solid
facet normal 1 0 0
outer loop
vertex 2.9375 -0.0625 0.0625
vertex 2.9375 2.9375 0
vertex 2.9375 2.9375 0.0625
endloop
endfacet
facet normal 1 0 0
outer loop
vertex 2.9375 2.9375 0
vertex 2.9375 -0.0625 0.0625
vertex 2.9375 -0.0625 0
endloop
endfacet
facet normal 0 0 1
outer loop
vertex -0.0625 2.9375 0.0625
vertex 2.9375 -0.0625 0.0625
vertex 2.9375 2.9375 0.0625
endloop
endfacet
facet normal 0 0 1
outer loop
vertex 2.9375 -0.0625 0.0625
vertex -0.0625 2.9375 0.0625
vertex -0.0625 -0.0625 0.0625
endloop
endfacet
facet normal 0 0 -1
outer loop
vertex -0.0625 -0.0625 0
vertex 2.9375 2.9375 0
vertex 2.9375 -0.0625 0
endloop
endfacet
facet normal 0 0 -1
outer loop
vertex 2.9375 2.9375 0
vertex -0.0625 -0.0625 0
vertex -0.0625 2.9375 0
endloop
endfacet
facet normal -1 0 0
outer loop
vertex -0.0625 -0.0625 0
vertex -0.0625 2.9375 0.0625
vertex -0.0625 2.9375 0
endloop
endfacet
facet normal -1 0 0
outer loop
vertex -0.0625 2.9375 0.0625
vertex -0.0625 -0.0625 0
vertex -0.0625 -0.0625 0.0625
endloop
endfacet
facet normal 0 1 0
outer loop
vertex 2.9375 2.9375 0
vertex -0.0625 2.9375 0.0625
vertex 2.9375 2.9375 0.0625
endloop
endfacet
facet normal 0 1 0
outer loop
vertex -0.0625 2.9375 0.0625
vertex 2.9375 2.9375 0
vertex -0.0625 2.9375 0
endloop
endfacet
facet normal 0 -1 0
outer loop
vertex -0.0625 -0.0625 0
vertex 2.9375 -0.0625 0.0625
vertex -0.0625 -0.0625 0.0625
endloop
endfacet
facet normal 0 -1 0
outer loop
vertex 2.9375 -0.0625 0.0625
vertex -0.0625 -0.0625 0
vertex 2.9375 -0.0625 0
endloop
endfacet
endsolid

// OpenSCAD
// element31.scad
// Element 31: Large gear (centered) with rotation arrows and mid ring, meshed with small gear
// Units: inches

plate_w = 2 + 7/8;
plate_d = 2 + 7/8;
plate_h = 1/16;

hole_d  = 3/32;
hole_r  = hole_d / 2;
frame_w = 1/16;

// ── Large gear ────────────────────────────────────────────────────────────────
lg_cx      = plate_w / 2;
lg_cy      = plate_d / 2;
lg_n       = 32;
lg_m       = 0.06;
tooth_h    = lg_m * 0.6;            // tooth height (shorter than full-depth)
lg_r_pit   = lg_n * lg_m / 2;       // 0.96
lg_r_tip   = lg_r_pit + tooth_h;    // 1.032
lg_r_root  = lg_r_pit - tooth_h;    // 0.888
lg_mid_r   = 0.30;                   // hub ring center radius
lg_mid_w   = 0.022;                  // hub ring half-width
lg_r_bore  = lg_mid_r + lg_mid_w;   // gear face extends inward to meet hub ring outer edge
lg_outline = 0.025;
arr_outline = 0.020;

// ── Small gear ────────────────────────────────────────────────────────────────
sg_n       = 10;
sg_m       = lg_m;
sg_r_pit   = sg_n * sg_m / 2;       // 0.36
sg_r_tip   = sg_r_pit + tooth_h;    // 0.432
sg_r_root  = sg_r_pit - tooth_h;    // 0.288
sg_r_hub      = 0.12;
sg_hub_ring_w = 0.012;               // half-width of hub ring (mirrors lg_mid_w)
sg_hub_ring_r = sg_r_hub - sg_hub_ring_w;  // ring sits flush with bore inner edge
sg_outline = 0.020;
sg_angle   = 45;
sg_tw_scale = 0.6;                  // tooth width fraction vs gap (1.0 = equal, 0.5 = half as wide)
sg_round_r  = 0.012;               // tooth corner rounding radius
sg_gap     = 0.003;                  // clearance between tooth tips
sg_cd      = lg_r_tip + sg_r_tip + sg_gap;
sg_cx      = lg_cx + sg_cd * cos(sg_angle);
sg_cy      = lg_cy + sg_cd * sin(sg_angle);
sg_phase   = -9;                     // gap at 225° aligns with lg tooth at 45° (n=10: default gap at 234°, rotate −9°)

// ── Rotation arrows (on gear body, between bore and root) ─────────────────────
arr_r_in   = lg_r_bore + 0.063;     // 0.56
arr_r_out  = lg_r_root - 0.073;     // 0.79
arr_r_mid  = (arr_r_in + arr_r_out) / 2;
arr_head_h      = 0.20;
arr_head_w      = arr_r_out - arr_r_in;   // full band width at arrowhead
arr_head_w_scale = 0.90;                  // arrowhead width as fraction of band width
arr_shaft_w     = 0.176;                   // shaft radial width (narrower than head)
arr_shaft_r_in  = arr_r_mid - arr_shaft_w / 2;
arr_shaft_r_out = arr_r_mid + arr_shaft_w / 2;
arr_arrow_span  = 55;                      // degrees each arrow arc covers
arr_arrow_gap   = 360 / 4 - arr_arrow_span; // gap between arrows (20°)

// ─────────────────────────────────────────────────────────────────────────────

module rivet_grid(z=0) {
    spacing_x = plate_w / 10;
    spacing_y = plate_d / 10;
    inset_x   = spacing_x / 2;
    inset_y   = spacing_y / 2;
    h = plate_h - 2 * z;
    for (i = [0:9]) translate([inset_x + i*spacing_x, inset_y,           z]) cylinder(h=h, r=hole_r, $fn=20);
    for (i = [0:9]) translate([inset_x + i*spacing_x, plate_d-inset_y,   z]) cylinder(h=h, r=hole_r, $fn=20);
    for (i = [0:9]) translate([inset_x,           inset_y + i*spacing_y, z]) cylinder(h=h, r=hole_r, $fn=20);
    for (i = [0:9]) translate([plate_w-inset_x, inset_y + i*spacing_y,   z]) cylinder(h=h, r=hole_r, $fn=20);
}

module frame_with_id(colors = []) {
    id_cover = plate_h / 8;
    region_w = plate_w / 6;
    region_d = plate_d / 6;
    mark_h   = plate_h - id_cover;

    color("black")
    difference() {
        translate([-frame_w, -frame_w, 0])
            cube([plate_w + 2 * frame_w, plate_d + 2 * frame_w, plate_h]);
        translate([0, 0, -0.001])
            cube([plate_w, plate_d, plate_h + 0.002]);
        // top/bottom/left/right straight runs only — corners stay solid black
        translate([0, plate_d - 0.001, -0.001])
            cube([plate_w, frame_w + 0.002, plate_h + 0.002]);
        translate([0, -frame_w - 0.001, -0.001])
            cube([plate_w, frame_w + 0.002, plate_h + 0.002]);
        translate([-frame_w - 0.001, 0, -0.001])
            cube([frame_w + 0.002, plate_d, plate_h + 0.002]);
        translate([plate_w - 0.001, 0, -0.001])
            cube([frame_w + 0.002, plate_d, plate_h + 0.002]);
    }

    for (i = [0:5]) {
        c     = (colors[i] != undef) ? colors[i] : "black";

        // top edge
        color(c) translate([i * region_w, plate_d, 0]) cube([region_w, frame_w, mark_h]);
        color("black") translate([i * region_w, plate_d, mark_h]) cube([region_w, frame_w, id_cover]);

        // bottom edge (reversed)
        color(c) translate([(5-i) * region_w, -frame_w, 0]) cube([region_w, frame_w, mark_h]);
        color("black") translate([(5-i) * region_w, -frame_w, mark_h]) cube([region_w, frame_w, id_cover]);

        // left edge
        color(c) translate([-frame_w, i * region_d, 0]) cube([frame_w, region_d, mark_h]);
        color("black") translate([-frame_w, i * region_d, mark_h]) cube([frame_w, region_d, id_cover]);

        // right edge (reversed)
        color(c) translate([plate_w, (5-i) * region_d, 0]) cube([frame_w, region_d, mark_h]);
        color("black") translate([plate_w, (5-i) * region_d, mark_h]) cube([frame_w, region_d, id_cover]);
    }
}

module plate() {
    color("darkgray")
    difference() {
        cube([plate_w, plate_d, plate_h]);
        rivet_grid();
        small_gear_outline(-1);
        large_gear_outline(-1);
    }
    color("lightgray") rivet_grid(0);
    color("black") small_gear_outline(0);
    color("black")  large_gear_outline(0);
}

// ── Gear geometry ─────────────────────────────────────────────────────────────

module gear_tooth_2d(n, r_t, r_r, tw_factor = 1.0) {
    tw = (360/n) / 4 * tw_factor;
    polygon([
        [r_r * cos(-tw),        r_r * sin(-tw)],
        [r_t * cos(-tw * 0.7),  r_t * sin(-tw * 0.7)],
        [r_t * cos( tw * 0.7),  r_t * sin( tw * 0.7)],
        [r_r * cos( tw),        r_r * sin( tw)],
    ]);
}

module gear_2d(n, r_t, r_r, tw_factor = 1.0, round_r = 0) {
    offset(r=round_r, $fn=16)
    offset(delta=-round_r)
    circle(r=r_r, $fn=n*8);
    union() {
        circle(r=r_r, $fn=n*8);
        for (i=[0:n-1]) rotate([0,0, i*(360/n)]) gear_tooth_2d(n, r_t, r_r, tw_factor);
    }
}


// ── Small gear ────────────────────────────────────────────────────────────────

module small_gear_outline(z = 0) {
    color("black")
    translate([sg_cx, sg_cy, z])
    rotate([0, 0, sg_phase])
    linear_extrude(plate_h - 2 * z)
    offset(delta = sg_outline) gear_2d(sg_n, sg_r_tip, sg_r_root, sg_tw_scale, sg_round_r);
}

module small_gear(z = 0) {
    color("green")
    translate([sg_cx, sg_cy, z])
    rotate([0, 0, sg_phase])
    linear_extrude(plate_h - 2 * z)
    gear_2d(sg_n, sg_r_tip, sg_r_root, sg_tw_scale, sg_round_r);
}

module small_gear_mid_ring(z = 0) {
    color("black")
    translate([sg_cx, sg_cy, z])
    linear_extrude(plate_h - 2 * z)
    circle(r = sg_hub_ring_r + sg_hub_ring_w, $fn=80);
}

module small_gear_hub(z = 0) {
    color("darkgray")
    translate([sg_cx, sg_cy, z])
    linear_extrude(plate_h - 2 * z)
    circle(r = sg_hub_ring_r - sg_hub_ring_w, $fn=80);
}

// ── Large gear ────────────────────────────────────────────────────────────────

module large_gear_outline(z = 0) {
    color("black")
    translate([lg_cx, lg_cy, z])
    linear_extrude(plate_h - 2 * z)
    offset(delta = lg_outline) gear_2d(lg_n, lg_r_tip, lg_r_root);
}

module large_gear(z = 0) {
    color("green")
    translate([lg_cx, lg_cy, z])
    linear_extrude(plate_h - 2 * z)
    gear_2d(lg_n, lg_r_tip, lg_r_root);
}

module large_gear_mid_ring(z = 0) {
    color("black")
    translate([lg_cx, lg_cy, z])
    linear_extrude(plate_h - 2 * z)
    difference() {
        circle(r = lg_mid_r + lg_mid_w, $fn=120);
        //circle(r = lg_mid_r - lg_mid_w, $fn=120);
    }
}

// ── Rotation arrows ───────────────────────────────────────────────────────────

module fan_2d(r, a1, a2) {
    polygon(concat([[0,0]], [for (a=[a1:1:a2]) [r*cos(a), r*sin(a)]]));
}

module annular_sector_2d(r_o, r_i, a1, a2) {
    intersection() {
        difference() {
            circle(r=r_o, $fn=120);
            circle(r=r_i, $fn=120);
        }
        fan_2d(r_o + 0.5, a1, a2);
    }
}

module rotation_arrows_2d() {
    union() {
        for (i = [0:3]) {
            a_head = 20 + i * 90;
            a_tail = a_head + arr_arrow_span;
            annular_sector_2d(arr_shaft_r_out, arr_shaft_r_in, a_head, a_tail);
            translate([arr_r_mid * cos(a_head), arr_r_mid * sin(a_head)])
            rotate([0, 0, a_head - 180])
            polygon([[0, arr_head_h], [-arr_head_w*arr_head_w_scale/2, 0], [arr_head_w*arr_head_w_scale/2, 0]]);
        }
    }
}

module rotation_arrows_outline(z = 0) {
    color("black")
    translate([lg_cx, lg_cy, z])
    linear_extrude(plate_h - 2 * z)
    offset(delta = arr_outline) rotation_arrows_2d();
}

module rotation_arrows(z = 0) {
    color("lightgray")
    translate([lg_cx, lg_cy, z])
    linear_extrude(plate_h - 2 * z)
    rotation_arrows_2d();
}

module large_gear_hub(z = 0) {
    color("darkgray")
    translate([lg_cx, lg_cy, z])
    linear_extrude(plate_h - 2 * z)
    circle(r = lg_mid_r - lg_mid_w, $fn=120);
}

// ── Layer chain ───────────────────────────────────────────────────────────────

module layer_sg()          { union() { difference() { plate();              small_gear(-1);                } small_gear();                } }
module layer_sg_mid_ring() { union() { difference() { layer_sg();           small_gear_mid_ring(-1);       } small_gear_mid_ring();       } }
module layer_sg_hub()      { union() { difference() { layer_sg_mid_ring();  small_gear_hub(-1);            } small_gear_hub();            } }
module layer_lg()          { union() { difference() { layer_sg_hub();       large_gear(-1);                } large_gear();                } }
module layer_lg_mid_ring() { union() { difference() { layer_lg();           large_gear_mid_ring(-1);       } large_gear_mid_ring();       } }
module layer_lg_hub()      { union() { difference() { layer_lg_mid_ring();  large_gear_hub(-1);            } large_gear_hub();            } }
module layer_arr_outline() { union() { difference() { layer_lg_hub();       rotation_arrows_outline(-1);   } rotation_arrows_outline();   } }
//module layer_arr()         { union() { difference() { layer_arr_outline();  rotation_arrows(-1);           }            } }
module layer_arr()         { union() { difference() { layer_arr_outline();  rotation_arrows(-1);           } rotation_arrows();           } }

// ─────────────────────────────────────────────────────────────────────────────
frame_with_id([undef, "green", undef, undef, "green", undef]);
plate();
//layer_sg();
//layer_sg_mid_ring();
//layer_sg_hub();
//layer_lg();
//layer_lg_mid_ring();
//layer_lg_hub();
//layer_arr_outline();
//layer_arr();
